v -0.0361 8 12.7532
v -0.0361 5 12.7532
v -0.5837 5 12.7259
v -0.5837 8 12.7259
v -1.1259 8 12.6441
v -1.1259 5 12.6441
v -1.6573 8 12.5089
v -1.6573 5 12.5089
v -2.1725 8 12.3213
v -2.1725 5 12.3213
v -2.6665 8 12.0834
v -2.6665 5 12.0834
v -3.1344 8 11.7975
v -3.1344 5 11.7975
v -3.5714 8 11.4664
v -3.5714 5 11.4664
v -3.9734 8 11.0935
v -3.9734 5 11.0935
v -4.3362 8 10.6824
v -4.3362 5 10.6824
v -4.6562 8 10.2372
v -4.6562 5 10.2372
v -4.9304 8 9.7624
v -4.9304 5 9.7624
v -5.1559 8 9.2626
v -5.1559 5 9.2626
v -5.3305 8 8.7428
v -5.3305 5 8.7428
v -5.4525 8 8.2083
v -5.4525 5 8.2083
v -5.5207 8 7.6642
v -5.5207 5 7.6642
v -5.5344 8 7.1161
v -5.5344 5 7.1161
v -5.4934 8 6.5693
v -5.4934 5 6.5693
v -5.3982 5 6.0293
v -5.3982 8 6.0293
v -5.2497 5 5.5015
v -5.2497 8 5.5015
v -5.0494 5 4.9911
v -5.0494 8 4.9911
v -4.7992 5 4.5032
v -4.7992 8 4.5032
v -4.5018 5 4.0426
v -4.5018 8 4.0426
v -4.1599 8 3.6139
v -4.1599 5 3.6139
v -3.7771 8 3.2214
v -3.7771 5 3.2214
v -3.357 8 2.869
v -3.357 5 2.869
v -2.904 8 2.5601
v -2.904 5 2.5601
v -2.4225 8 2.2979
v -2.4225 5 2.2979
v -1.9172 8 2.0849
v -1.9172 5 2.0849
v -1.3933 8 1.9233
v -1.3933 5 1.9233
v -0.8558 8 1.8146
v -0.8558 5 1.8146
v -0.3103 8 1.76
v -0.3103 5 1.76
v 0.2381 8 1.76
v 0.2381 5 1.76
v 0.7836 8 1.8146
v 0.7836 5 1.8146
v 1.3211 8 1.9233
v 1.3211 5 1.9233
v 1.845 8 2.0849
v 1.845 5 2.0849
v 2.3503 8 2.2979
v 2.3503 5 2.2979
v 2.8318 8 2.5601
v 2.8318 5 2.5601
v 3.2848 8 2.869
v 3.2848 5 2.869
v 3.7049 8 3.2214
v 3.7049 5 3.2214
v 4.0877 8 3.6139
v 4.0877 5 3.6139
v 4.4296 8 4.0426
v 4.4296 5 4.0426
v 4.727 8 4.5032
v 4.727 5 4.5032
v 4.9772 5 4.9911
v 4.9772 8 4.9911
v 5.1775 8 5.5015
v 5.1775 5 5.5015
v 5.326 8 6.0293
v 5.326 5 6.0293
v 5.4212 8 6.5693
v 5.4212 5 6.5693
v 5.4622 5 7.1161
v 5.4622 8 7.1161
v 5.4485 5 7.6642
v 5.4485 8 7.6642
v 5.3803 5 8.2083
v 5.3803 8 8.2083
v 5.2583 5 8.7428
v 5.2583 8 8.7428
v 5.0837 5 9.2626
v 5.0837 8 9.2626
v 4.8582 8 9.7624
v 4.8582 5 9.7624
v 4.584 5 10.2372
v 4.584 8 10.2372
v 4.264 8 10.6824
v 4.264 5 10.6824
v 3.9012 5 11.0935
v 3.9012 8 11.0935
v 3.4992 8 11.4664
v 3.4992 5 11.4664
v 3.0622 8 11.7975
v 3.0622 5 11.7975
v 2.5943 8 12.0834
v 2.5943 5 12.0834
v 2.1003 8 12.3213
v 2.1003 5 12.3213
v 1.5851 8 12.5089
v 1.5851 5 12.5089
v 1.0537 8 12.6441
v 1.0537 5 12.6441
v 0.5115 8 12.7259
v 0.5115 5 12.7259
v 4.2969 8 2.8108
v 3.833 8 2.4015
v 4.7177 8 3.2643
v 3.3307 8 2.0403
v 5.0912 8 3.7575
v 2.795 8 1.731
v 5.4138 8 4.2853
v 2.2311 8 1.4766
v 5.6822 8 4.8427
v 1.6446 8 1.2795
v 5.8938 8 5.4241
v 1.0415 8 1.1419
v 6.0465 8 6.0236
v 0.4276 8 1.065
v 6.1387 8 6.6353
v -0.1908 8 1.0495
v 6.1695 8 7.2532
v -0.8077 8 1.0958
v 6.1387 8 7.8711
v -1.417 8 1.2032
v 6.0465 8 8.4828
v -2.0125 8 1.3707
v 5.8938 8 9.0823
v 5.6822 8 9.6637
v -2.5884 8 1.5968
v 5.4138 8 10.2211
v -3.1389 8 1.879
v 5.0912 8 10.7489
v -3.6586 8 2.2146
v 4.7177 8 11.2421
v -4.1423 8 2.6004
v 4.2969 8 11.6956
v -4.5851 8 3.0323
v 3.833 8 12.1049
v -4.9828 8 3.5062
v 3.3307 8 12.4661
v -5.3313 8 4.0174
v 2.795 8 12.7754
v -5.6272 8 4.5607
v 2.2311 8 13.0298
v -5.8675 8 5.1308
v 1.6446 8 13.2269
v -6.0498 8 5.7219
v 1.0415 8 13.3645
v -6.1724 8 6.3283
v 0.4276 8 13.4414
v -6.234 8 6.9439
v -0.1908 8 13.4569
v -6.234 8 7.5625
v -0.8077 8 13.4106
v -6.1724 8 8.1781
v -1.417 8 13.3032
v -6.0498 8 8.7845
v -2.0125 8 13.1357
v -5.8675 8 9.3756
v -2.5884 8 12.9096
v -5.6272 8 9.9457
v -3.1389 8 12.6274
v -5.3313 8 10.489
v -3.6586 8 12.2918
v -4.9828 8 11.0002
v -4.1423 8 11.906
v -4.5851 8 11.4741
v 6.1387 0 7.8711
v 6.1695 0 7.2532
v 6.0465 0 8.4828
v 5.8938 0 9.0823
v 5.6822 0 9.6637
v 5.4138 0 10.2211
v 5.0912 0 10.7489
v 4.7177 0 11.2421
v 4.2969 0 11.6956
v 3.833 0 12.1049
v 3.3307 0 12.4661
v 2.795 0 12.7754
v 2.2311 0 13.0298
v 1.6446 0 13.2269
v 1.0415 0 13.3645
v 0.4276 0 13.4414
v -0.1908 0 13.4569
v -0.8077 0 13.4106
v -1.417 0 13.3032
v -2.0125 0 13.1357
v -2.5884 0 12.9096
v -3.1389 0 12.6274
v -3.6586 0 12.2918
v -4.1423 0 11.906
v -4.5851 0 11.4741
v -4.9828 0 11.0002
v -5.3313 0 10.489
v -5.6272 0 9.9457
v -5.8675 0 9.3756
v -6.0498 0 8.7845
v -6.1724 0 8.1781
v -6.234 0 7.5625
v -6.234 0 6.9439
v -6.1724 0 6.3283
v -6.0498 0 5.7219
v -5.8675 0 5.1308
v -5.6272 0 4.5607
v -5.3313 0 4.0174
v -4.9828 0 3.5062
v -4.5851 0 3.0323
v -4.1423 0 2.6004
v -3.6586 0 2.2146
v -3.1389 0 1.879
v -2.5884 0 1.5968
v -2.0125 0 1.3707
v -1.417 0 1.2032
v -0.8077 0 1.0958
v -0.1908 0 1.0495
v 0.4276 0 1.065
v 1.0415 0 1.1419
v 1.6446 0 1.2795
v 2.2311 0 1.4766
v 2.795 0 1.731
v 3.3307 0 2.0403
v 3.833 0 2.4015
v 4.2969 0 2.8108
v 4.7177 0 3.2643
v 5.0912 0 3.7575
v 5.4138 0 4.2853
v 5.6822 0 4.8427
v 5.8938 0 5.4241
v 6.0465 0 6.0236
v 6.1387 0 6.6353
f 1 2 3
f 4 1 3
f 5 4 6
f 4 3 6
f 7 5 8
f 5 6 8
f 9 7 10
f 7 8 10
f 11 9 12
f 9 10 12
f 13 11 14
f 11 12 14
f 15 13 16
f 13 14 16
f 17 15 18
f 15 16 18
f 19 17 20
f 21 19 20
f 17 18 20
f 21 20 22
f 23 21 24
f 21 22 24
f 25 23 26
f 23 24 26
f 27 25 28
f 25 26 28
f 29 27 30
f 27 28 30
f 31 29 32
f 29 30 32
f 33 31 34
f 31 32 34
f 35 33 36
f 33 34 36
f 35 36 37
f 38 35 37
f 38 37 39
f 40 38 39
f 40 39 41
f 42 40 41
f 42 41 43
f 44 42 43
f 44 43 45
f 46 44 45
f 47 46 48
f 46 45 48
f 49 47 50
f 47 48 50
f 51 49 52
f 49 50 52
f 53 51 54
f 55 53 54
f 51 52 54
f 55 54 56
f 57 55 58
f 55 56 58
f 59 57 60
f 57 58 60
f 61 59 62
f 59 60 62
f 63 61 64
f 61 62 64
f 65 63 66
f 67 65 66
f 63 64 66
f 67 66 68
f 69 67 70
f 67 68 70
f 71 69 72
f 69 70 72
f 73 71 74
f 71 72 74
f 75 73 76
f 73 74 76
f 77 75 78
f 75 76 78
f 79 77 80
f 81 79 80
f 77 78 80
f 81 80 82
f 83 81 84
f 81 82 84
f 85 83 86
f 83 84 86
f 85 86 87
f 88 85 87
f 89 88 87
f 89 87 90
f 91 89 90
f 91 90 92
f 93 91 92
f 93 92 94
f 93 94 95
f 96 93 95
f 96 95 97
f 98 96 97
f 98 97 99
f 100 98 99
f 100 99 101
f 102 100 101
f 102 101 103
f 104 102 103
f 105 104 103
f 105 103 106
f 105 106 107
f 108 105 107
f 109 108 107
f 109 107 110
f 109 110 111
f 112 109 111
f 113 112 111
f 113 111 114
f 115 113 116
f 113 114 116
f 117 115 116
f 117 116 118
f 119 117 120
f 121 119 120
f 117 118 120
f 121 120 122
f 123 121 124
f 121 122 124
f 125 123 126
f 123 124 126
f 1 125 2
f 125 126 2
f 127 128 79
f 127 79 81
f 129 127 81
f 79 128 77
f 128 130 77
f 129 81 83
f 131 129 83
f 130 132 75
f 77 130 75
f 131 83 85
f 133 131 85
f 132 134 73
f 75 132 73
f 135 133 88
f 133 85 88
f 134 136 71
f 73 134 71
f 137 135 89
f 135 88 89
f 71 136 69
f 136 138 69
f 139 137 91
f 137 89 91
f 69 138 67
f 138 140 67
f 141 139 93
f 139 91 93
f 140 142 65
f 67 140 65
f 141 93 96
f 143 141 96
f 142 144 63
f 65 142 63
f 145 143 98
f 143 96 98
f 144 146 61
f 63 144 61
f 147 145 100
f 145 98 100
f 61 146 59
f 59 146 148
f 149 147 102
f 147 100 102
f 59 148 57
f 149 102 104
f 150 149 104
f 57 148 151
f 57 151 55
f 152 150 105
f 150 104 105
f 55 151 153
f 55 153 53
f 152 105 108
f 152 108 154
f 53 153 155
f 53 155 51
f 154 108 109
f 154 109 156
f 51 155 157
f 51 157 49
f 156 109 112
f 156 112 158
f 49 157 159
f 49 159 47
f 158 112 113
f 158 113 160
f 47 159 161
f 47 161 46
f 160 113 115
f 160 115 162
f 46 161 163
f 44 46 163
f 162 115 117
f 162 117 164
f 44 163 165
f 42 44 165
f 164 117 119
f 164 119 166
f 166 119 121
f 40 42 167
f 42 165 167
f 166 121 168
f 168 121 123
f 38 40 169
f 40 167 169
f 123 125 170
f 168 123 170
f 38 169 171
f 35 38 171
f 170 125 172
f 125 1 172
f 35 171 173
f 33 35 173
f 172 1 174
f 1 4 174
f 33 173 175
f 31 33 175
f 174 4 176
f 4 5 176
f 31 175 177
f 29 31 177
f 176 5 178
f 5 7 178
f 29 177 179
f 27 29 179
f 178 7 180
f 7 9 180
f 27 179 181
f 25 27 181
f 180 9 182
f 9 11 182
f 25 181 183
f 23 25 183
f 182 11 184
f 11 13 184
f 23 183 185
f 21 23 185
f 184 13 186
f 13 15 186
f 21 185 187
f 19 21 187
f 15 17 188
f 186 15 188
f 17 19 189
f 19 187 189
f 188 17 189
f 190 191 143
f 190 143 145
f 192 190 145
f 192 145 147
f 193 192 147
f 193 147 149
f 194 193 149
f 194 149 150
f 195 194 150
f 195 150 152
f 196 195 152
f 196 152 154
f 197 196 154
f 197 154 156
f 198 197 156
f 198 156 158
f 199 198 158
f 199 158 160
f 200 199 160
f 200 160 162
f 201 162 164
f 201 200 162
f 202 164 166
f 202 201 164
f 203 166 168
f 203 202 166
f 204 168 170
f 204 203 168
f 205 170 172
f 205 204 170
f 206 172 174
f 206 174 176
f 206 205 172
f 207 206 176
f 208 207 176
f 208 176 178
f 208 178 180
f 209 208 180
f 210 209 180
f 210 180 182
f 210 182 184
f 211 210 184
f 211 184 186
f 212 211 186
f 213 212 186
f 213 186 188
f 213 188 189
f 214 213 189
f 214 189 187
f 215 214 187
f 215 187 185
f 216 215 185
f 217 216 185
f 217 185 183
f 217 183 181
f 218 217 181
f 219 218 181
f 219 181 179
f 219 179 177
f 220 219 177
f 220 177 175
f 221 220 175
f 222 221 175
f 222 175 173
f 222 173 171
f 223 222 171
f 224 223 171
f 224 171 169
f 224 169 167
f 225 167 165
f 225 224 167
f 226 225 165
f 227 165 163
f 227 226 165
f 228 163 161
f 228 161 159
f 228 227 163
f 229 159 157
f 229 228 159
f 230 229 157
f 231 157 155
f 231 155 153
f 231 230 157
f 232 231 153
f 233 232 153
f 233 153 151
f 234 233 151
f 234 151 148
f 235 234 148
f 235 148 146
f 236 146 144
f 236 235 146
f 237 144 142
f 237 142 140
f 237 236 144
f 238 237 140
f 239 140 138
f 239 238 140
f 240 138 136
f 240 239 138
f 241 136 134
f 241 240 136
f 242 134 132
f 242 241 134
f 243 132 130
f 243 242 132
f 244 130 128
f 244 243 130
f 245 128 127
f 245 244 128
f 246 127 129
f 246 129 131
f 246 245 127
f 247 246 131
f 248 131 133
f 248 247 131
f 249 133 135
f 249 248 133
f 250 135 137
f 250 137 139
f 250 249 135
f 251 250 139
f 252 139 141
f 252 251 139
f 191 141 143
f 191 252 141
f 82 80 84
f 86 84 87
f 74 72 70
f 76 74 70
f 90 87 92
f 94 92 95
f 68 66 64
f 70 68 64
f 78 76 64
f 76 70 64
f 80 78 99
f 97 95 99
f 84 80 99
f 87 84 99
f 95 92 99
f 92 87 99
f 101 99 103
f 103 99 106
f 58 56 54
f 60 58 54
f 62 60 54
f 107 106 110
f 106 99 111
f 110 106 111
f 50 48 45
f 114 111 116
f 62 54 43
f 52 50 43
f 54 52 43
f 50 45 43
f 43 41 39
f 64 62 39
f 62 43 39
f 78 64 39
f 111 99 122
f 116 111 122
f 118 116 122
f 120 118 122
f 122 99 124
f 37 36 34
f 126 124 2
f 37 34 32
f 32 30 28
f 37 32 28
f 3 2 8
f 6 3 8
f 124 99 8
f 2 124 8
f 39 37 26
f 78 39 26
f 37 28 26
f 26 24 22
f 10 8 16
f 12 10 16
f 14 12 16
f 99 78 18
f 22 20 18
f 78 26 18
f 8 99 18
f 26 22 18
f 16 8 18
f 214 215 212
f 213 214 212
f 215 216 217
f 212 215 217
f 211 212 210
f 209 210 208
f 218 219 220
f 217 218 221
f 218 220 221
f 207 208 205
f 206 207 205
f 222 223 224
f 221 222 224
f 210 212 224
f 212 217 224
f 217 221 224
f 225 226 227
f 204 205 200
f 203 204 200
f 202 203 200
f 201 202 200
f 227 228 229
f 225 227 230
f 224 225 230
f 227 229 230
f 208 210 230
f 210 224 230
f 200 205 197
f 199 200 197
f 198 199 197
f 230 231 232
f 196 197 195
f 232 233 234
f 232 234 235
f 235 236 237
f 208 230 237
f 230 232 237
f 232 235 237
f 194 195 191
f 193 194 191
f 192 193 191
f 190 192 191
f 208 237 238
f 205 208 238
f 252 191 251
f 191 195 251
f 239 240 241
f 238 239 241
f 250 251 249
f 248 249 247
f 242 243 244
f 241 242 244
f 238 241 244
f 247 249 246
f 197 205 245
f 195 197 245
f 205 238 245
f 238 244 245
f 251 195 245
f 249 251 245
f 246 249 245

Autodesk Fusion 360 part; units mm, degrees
sketch "Sketch1" plane through (0, 0, 0) normal (0, 0, 1) x (1, 0, 0)
  curve L0
  curve L1
  curve L2
  curve L3
sketch "Sketch2" plane through (0, 0, 0) normal (0, 1, 0) x (1, 0, 0)
  circle A0 centre (-0.0361, -7.2532) radius 6.2056
extrude "Extrude2" add sketch "Sketch2" along normal blind 11
hole "Hole1" at (-1.2862, 11, 9.8296) direction (0, -1, 0) diameter 19 depth 3 tip angle 180
hole "Hole2" at (-0.0361, 8, 7.2532) direction (0, -1, 0) diameter 11 depth 3 tip angle 180
